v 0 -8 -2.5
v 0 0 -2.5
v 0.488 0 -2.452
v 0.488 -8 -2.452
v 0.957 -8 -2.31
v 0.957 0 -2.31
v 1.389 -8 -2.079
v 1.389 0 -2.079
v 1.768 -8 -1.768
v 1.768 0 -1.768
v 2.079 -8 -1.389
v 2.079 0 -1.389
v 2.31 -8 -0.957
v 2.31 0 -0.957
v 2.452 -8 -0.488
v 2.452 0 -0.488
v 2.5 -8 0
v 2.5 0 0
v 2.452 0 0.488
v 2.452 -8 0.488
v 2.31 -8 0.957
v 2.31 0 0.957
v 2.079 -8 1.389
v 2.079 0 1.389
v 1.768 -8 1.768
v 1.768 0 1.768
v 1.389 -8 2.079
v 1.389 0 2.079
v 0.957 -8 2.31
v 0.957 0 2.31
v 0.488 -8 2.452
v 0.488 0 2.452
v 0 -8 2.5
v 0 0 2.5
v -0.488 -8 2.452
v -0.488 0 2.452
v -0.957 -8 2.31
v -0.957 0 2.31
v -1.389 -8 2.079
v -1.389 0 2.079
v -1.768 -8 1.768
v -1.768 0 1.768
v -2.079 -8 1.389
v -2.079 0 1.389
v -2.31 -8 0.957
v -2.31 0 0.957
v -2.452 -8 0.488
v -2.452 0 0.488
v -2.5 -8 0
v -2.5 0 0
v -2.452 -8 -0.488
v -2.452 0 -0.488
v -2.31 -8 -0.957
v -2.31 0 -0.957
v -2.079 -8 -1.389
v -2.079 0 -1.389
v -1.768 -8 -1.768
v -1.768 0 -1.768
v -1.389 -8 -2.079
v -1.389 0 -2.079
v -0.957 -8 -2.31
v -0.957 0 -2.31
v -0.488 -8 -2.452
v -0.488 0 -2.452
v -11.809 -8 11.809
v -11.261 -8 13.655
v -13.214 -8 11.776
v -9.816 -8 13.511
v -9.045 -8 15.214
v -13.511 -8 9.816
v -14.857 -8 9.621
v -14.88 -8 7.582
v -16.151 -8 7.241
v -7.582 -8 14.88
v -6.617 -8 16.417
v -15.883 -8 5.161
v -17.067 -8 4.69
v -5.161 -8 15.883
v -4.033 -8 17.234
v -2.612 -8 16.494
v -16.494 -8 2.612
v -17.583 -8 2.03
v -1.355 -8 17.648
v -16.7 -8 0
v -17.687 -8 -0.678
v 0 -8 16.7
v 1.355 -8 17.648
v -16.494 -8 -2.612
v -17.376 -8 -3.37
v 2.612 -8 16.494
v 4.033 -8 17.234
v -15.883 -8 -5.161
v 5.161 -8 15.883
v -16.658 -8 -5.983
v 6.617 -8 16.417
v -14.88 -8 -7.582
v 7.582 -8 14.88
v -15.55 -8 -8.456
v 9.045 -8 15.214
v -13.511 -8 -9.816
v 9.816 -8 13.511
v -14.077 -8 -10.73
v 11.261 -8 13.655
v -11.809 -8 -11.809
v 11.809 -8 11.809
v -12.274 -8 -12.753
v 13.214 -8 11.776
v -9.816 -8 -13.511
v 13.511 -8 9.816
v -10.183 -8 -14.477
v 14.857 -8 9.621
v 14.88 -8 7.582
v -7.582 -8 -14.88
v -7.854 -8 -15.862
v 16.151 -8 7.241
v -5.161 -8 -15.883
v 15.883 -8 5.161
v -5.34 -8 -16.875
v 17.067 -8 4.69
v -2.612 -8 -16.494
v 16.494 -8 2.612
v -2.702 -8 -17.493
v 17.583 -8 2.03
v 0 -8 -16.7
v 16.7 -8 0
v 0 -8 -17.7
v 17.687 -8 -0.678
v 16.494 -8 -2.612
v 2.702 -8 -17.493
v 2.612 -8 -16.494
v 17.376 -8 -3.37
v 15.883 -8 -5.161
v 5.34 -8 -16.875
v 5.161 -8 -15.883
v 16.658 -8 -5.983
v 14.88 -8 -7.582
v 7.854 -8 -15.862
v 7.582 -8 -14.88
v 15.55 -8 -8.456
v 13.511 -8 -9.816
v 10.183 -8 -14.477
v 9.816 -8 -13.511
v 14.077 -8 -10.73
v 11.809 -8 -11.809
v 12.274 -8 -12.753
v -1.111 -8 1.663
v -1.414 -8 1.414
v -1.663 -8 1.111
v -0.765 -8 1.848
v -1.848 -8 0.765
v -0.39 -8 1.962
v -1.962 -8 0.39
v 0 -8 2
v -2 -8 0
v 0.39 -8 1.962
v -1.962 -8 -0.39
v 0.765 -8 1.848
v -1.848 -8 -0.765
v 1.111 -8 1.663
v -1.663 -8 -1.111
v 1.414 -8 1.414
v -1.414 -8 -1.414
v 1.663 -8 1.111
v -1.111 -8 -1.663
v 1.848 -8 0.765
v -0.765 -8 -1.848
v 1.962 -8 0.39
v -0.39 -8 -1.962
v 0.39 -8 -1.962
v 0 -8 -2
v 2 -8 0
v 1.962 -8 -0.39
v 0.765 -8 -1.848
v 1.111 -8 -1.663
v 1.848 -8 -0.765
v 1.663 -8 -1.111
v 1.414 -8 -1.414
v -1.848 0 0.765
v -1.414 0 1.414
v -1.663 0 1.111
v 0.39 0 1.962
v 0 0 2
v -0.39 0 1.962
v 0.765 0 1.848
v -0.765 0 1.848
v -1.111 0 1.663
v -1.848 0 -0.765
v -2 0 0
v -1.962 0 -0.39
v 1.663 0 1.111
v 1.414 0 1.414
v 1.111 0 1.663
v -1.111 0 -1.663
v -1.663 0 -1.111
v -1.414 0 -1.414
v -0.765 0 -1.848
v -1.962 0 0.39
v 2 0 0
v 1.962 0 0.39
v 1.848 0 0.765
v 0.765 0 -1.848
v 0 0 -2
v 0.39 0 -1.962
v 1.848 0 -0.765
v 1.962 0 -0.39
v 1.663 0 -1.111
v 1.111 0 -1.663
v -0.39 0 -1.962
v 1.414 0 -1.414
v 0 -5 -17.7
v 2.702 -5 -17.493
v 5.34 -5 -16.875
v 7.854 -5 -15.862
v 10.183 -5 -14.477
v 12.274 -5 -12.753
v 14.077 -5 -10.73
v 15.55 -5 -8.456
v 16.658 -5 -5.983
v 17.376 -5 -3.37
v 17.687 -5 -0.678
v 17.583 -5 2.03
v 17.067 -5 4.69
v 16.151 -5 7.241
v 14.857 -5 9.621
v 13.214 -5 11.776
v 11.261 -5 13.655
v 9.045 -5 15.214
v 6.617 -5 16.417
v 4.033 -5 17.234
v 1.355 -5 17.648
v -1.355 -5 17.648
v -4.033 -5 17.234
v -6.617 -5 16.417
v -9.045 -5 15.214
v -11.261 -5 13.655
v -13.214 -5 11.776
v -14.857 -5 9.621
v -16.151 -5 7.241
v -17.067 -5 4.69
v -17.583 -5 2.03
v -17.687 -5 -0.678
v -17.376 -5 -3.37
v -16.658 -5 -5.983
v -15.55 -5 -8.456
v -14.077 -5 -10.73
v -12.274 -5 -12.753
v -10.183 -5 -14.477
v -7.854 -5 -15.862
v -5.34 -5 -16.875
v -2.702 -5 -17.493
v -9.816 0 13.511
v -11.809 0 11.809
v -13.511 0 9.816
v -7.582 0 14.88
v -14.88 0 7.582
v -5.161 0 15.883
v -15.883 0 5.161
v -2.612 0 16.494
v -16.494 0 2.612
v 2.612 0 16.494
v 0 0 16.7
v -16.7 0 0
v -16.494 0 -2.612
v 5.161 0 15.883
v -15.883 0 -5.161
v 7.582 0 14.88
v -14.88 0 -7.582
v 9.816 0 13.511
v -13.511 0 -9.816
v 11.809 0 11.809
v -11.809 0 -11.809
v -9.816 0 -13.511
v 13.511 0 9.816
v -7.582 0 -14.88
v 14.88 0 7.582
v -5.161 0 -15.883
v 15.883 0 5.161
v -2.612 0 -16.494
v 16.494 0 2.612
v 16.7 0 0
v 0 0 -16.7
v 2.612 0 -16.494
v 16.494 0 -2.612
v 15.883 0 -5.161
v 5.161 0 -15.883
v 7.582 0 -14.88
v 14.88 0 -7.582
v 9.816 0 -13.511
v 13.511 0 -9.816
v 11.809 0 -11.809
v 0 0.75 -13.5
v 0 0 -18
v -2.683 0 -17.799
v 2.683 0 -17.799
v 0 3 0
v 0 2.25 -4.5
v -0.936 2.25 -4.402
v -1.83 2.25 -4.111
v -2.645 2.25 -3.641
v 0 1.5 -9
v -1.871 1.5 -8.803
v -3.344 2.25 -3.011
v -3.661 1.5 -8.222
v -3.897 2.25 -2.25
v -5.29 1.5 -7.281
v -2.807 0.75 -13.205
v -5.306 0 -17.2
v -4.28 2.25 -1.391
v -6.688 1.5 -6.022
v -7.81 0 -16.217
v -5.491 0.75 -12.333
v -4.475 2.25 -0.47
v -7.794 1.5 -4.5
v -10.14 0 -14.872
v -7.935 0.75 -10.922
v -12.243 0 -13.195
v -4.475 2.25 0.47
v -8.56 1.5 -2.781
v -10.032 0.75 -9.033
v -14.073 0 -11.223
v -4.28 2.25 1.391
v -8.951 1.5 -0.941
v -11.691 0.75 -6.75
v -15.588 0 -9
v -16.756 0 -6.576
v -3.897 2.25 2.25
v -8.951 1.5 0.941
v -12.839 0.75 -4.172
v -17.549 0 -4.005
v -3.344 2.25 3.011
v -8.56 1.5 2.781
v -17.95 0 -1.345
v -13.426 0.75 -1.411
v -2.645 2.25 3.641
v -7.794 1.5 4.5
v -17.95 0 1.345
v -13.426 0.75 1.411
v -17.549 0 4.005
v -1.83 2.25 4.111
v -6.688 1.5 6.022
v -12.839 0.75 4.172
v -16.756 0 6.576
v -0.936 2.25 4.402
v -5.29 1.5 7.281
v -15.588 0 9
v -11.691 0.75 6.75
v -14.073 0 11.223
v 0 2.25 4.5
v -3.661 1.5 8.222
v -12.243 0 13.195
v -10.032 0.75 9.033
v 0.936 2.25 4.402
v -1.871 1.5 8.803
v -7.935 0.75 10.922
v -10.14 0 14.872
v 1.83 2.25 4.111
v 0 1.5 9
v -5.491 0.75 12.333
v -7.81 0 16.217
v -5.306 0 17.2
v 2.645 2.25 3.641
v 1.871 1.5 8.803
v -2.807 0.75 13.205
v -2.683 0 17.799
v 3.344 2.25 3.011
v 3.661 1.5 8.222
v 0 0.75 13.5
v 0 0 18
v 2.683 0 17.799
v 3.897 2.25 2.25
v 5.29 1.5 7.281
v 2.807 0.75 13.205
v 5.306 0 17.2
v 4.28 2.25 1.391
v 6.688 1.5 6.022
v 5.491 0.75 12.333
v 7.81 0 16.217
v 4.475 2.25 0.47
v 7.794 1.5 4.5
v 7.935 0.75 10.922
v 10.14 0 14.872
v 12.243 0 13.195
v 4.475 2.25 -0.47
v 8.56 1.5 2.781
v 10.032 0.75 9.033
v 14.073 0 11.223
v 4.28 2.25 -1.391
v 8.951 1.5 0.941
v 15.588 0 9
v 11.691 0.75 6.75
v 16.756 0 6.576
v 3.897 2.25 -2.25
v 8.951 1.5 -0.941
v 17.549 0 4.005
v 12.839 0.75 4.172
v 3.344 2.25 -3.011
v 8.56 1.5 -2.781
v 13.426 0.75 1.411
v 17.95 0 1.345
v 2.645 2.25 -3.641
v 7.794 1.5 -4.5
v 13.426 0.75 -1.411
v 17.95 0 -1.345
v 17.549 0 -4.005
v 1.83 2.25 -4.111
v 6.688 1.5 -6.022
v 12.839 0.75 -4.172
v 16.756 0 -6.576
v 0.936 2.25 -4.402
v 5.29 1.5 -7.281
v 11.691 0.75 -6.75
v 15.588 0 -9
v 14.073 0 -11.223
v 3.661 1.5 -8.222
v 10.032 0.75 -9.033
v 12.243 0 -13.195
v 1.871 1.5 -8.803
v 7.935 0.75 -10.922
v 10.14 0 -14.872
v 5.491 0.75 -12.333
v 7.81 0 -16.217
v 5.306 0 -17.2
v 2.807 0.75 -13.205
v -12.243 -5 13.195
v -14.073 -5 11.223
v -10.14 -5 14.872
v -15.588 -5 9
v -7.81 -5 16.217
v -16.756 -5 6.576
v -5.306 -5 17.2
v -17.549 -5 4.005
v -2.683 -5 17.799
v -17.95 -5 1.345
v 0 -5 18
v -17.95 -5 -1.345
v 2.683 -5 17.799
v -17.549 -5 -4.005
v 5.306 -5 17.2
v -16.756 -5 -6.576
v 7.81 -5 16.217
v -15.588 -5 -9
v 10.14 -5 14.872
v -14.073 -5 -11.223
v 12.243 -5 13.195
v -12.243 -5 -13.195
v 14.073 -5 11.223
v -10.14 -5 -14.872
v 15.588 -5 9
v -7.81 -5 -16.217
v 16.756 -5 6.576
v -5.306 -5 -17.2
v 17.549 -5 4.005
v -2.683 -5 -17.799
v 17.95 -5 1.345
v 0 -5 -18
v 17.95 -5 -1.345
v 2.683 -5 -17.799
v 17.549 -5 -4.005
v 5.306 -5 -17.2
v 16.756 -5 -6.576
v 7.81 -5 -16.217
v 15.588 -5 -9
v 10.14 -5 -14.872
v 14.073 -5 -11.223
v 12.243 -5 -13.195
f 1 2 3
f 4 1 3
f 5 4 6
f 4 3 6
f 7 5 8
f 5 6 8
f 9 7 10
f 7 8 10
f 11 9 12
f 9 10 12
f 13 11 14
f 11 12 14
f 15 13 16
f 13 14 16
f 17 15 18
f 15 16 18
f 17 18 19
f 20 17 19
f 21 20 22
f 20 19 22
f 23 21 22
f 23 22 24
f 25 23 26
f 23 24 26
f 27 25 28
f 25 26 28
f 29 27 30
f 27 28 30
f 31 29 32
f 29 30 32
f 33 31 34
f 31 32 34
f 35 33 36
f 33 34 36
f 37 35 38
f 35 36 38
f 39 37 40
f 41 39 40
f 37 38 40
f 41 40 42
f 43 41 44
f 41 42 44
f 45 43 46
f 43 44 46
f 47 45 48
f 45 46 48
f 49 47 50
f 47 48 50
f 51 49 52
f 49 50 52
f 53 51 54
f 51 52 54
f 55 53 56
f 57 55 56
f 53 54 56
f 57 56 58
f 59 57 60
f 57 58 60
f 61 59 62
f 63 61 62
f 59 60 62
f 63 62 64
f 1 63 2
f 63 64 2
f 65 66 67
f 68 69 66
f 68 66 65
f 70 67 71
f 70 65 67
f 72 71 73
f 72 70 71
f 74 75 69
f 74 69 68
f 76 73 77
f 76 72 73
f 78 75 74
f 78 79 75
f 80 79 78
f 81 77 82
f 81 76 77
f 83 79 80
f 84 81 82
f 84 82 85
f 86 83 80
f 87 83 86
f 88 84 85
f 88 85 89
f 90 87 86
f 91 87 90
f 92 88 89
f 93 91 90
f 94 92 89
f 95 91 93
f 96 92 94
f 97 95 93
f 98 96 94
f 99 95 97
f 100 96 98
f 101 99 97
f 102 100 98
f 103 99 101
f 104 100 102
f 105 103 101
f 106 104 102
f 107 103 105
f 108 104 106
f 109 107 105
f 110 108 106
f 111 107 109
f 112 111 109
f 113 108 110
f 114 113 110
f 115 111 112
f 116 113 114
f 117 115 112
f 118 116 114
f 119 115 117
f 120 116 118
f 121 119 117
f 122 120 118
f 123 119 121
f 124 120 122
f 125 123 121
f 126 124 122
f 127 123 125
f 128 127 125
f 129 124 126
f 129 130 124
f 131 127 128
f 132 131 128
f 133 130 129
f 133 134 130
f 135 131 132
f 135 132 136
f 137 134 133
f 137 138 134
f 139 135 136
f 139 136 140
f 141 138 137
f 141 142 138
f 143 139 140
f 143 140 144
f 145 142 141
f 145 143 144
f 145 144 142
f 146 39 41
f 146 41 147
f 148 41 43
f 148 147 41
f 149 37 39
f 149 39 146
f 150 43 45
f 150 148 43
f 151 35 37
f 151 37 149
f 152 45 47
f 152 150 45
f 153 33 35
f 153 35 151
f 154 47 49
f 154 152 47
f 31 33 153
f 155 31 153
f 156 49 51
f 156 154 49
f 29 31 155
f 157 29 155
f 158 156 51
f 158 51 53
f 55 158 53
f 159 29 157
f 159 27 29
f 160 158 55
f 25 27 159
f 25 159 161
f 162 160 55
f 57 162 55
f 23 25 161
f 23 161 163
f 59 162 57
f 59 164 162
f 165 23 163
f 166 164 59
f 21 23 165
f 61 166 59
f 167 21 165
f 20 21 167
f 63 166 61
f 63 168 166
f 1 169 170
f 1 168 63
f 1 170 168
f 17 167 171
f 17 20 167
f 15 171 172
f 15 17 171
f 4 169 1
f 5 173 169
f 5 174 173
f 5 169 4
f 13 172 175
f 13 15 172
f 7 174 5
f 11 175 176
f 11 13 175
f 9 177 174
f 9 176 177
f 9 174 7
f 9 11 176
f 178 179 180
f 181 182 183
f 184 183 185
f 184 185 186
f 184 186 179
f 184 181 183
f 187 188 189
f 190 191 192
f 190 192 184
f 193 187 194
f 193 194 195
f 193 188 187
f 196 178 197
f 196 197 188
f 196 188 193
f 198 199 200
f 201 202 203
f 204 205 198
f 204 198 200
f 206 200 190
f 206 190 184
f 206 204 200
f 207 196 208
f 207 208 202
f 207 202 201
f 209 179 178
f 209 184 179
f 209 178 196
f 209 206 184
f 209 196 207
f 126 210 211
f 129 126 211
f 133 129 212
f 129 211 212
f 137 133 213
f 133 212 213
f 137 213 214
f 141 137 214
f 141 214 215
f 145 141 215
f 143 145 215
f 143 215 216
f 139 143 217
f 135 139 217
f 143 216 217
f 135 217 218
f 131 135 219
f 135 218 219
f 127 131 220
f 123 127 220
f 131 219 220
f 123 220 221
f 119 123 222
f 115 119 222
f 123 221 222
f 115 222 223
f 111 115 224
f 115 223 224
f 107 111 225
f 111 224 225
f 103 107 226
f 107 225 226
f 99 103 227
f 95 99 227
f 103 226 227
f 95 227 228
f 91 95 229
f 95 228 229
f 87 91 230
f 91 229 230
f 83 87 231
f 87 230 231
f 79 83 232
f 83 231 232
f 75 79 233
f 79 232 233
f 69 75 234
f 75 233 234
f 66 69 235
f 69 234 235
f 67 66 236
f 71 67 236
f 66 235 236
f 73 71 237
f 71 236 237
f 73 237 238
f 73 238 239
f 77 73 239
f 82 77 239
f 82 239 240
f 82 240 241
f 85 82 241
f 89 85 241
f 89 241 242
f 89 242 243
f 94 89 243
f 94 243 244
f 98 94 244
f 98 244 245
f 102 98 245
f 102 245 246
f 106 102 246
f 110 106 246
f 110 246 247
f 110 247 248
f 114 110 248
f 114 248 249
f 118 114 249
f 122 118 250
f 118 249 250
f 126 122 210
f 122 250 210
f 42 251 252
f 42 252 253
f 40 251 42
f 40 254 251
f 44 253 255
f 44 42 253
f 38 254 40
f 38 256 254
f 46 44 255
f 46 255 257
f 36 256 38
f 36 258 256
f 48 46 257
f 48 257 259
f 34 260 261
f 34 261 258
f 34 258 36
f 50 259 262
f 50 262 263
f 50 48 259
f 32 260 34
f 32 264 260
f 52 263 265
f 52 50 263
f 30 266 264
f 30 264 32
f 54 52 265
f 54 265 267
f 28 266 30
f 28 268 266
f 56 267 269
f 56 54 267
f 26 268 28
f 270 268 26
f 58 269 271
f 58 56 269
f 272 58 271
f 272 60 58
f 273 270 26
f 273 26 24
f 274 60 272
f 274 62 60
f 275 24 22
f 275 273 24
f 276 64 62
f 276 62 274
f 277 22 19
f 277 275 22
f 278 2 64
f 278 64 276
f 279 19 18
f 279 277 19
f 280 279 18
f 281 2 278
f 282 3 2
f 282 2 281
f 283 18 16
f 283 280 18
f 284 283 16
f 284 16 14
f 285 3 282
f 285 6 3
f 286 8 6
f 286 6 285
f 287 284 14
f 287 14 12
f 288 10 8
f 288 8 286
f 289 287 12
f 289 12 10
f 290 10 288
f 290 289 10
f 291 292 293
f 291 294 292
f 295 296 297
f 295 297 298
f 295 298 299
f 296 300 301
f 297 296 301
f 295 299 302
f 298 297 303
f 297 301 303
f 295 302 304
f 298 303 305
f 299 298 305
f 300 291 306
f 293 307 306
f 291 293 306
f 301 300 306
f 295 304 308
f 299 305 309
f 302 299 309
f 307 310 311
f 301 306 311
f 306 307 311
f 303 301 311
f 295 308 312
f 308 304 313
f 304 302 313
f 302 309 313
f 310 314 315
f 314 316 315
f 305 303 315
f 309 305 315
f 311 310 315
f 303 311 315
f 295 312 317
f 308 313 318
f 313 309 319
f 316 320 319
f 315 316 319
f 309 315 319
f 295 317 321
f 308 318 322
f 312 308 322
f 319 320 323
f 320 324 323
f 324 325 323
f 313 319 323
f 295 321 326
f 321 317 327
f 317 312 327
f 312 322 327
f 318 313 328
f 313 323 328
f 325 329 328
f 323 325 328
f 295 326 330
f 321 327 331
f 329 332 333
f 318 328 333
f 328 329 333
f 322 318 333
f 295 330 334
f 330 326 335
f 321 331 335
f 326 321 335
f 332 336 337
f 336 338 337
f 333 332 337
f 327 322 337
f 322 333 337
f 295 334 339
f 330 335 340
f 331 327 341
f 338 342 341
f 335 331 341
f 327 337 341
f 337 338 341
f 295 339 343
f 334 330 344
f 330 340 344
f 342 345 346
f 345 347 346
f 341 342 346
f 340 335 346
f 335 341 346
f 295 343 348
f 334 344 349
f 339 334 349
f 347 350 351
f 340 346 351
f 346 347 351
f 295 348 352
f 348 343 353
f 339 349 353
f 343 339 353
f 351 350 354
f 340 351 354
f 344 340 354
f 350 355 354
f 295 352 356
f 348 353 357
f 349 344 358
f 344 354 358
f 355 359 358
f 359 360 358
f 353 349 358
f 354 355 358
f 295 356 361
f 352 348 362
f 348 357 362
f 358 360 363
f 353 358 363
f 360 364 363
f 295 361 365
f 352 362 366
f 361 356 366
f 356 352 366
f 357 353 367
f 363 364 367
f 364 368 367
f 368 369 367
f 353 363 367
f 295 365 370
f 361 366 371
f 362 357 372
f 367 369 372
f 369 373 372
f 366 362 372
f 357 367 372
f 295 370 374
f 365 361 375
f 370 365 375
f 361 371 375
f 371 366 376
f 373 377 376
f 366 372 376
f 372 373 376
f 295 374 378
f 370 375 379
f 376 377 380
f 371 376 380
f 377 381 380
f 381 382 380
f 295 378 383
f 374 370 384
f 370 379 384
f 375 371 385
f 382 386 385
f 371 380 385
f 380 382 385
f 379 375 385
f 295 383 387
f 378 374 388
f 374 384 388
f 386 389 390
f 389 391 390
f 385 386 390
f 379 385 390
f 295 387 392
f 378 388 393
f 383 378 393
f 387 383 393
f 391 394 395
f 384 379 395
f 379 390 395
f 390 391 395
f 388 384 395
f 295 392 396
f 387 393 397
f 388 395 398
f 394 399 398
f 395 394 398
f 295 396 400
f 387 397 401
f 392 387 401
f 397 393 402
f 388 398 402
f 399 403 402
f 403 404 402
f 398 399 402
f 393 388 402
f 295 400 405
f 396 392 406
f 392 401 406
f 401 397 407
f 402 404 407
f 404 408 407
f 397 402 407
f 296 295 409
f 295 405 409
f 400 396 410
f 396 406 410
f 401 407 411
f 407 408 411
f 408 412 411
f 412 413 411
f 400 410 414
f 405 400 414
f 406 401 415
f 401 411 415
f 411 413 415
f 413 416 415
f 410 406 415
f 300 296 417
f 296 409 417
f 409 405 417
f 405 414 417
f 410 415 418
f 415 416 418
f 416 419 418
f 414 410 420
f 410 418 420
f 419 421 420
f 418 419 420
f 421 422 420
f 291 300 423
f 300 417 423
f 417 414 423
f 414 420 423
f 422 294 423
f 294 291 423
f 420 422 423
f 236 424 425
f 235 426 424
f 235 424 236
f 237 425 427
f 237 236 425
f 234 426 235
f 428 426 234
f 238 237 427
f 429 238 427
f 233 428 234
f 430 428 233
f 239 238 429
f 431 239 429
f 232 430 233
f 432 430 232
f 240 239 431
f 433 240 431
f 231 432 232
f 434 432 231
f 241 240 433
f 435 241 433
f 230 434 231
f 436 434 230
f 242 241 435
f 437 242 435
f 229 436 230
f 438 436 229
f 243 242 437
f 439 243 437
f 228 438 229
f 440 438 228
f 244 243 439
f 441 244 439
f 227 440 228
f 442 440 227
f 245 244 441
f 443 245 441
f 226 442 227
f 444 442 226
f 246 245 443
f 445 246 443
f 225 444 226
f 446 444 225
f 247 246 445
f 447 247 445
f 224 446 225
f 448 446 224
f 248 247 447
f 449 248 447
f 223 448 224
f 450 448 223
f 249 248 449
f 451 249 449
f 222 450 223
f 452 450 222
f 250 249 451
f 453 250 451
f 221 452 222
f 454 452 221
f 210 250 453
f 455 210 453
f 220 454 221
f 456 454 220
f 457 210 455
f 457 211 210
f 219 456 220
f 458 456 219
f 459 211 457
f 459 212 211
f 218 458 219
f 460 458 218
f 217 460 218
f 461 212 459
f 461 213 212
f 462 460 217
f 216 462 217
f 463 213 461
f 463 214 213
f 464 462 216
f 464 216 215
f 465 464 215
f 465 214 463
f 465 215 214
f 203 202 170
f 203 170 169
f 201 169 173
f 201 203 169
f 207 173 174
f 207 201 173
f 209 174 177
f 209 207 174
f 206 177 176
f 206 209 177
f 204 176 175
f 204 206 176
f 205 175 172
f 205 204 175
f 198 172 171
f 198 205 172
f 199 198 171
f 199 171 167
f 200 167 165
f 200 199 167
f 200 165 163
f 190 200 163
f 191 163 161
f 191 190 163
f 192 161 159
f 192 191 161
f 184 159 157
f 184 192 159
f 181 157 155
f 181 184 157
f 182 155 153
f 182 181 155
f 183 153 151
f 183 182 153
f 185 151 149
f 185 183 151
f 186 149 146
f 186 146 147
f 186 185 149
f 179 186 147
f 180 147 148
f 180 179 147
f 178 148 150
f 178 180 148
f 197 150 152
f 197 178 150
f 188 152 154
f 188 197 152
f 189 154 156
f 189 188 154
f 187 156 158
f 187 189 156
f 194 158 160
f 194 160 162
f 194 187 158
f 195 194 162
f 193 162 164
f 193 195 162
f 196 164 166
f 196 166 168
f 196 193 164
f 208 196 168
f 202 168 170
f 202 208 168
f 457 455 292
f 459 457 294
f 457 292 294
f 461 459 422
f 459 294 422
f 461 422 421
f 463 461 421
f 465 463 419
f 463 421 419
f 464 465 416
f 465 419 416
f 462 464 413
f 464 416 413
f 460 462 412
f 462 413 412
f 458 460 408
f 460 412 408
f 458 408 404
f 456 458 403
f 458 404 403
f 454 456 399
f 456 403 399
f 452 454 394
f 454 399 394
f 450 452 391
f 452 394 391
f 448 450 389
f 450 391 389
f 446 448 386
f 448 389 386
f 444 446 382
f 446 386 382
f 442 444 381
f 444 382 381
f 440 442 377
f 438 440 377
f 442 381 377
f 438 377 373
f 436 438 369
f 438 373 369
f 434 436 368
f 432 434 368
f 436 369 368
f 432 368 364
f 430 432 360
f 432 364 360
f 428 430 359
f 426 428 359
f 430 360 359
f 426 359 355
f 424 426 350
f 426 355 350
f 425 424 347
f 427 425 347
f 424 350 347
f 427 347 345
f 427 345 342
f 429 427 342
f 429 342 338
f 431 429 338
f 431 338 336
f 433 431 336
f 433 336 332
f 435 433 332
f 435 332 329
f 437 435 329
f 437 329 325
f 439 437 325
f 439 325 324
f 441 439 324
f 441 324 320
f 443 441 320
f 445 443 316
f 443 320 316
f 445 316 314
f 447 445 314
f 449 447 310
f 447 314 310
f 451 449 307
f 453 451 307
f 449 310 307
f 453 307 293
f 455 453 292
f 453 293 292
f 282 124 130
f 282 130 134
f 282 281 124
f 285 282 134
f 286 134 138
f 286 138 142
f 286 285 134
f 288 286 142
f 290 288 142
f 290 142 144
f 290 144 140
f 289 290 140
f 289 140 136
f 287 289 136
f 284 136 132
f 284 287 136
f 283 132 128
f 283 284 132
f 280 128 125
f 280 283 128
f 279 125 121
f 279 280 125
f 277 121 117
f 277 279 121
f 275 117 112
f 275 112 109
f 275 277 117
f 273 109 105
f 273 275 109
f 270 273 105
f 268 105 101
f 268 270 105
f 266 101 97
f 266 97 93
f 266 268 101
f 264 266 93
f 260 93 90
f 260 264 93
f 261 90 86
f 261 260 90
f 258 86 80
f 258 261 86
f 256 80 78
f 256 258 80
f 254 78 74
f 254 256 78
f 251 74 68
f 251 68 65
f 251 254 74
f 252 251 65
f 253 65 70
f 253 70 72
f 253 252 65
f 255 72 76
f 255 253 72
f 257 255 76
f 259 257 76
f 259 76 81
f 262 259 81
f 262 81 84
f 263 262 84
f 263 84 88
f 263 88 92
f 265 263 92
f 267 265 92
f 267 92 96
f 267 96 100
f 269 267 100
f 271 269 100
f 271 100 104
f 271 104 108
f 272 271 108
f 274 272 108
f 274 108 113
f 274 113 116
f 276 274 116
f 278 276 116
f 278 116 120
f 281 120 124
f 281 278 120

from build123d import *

# Parameters (mm, degrees)
SKETCH2_R           = 18
BOSS_EXTRUDE1_DEPTH = 5
SKETCH3_R           = 17.7
SKETCH3_R_2         = 16.7
BOSS_EXTRUDE2_DEPTH = 3
CUT_EXTRUDE1_START  = -5
SKETCH4_R           = 16.7
CUT_EXTRUDE1_DEPTH  = 5
SKETCH5_R           = 2.5
SKETCH5_R_2         = 2
BOSS_EXTRUDE3_DEPTH = 8


with BuildPart() as part:
    # Sketch1 → Revolve1 (revolve)
    with BuildSketch(Plane(origin=(0, 0, 0), x_dir=(0, 0, -1), z_dir=(1, 0, 0))):
        Polygon((0, 0), (0, 3), (18, 0), align=None)
    revolve(axis=Axis((0, 0, 0), (0, 1, 0)))

    # Sketch2 → Boss-Extrude1 (add)
    with BuildSketch(Plane.XZ):
        with Locations(Location((0, 0, 0), (0, 0, 270))):
            Circle(SKETCH2_R)
    extrude(amount=BOSS_EXTRUDE1_DEPTH)

    # Sketch3 → Boss-Extrude2 (add)
    with BuildSketch(Plane.XZ.offset(5)):
        with Locations(Location((0, 0, 0), (0, 0, 270))):
            Circle(SKETCH3_R)
        with Locations(Location((0, 0, 0), (0, 0, 270))):
            Circle(SKETCH3_R_2, mode=Mode.SUBTRACT)
    extrude(amount=BOSS_EXTRUDE2_DEPTH)

    # Sketch4 → Cut-Extrude1 (cut)
    with BuildSketch(Plane.XZ.offset(5).offset(CUT_EXTRUDE1_START)):
        with Locations(Location((0, 0, 0), (0, 0, 270))):
            Circle(SKETCH4_R)
    extrude(amount=CUT_EXTRUDE1_DEPTH, mode=Mode.SUBTRACT)

    # Sketch5 → Boss-Extrude3 (add)
    with BuildSketch(Plane.XZ):
        with Locations(Location((0, 0, 0), (0, 0, 270))):
            Circle(SKETCH5_R)
        with Locations(Location((0, 0, 0), (0, 0, 270))):
            Circle(SKETCH5_R_2, mode=Mode.SUBTRACT)
    extrude(amount=BOSS_EXTRUDE3_DEPTH)


solid = part.part
